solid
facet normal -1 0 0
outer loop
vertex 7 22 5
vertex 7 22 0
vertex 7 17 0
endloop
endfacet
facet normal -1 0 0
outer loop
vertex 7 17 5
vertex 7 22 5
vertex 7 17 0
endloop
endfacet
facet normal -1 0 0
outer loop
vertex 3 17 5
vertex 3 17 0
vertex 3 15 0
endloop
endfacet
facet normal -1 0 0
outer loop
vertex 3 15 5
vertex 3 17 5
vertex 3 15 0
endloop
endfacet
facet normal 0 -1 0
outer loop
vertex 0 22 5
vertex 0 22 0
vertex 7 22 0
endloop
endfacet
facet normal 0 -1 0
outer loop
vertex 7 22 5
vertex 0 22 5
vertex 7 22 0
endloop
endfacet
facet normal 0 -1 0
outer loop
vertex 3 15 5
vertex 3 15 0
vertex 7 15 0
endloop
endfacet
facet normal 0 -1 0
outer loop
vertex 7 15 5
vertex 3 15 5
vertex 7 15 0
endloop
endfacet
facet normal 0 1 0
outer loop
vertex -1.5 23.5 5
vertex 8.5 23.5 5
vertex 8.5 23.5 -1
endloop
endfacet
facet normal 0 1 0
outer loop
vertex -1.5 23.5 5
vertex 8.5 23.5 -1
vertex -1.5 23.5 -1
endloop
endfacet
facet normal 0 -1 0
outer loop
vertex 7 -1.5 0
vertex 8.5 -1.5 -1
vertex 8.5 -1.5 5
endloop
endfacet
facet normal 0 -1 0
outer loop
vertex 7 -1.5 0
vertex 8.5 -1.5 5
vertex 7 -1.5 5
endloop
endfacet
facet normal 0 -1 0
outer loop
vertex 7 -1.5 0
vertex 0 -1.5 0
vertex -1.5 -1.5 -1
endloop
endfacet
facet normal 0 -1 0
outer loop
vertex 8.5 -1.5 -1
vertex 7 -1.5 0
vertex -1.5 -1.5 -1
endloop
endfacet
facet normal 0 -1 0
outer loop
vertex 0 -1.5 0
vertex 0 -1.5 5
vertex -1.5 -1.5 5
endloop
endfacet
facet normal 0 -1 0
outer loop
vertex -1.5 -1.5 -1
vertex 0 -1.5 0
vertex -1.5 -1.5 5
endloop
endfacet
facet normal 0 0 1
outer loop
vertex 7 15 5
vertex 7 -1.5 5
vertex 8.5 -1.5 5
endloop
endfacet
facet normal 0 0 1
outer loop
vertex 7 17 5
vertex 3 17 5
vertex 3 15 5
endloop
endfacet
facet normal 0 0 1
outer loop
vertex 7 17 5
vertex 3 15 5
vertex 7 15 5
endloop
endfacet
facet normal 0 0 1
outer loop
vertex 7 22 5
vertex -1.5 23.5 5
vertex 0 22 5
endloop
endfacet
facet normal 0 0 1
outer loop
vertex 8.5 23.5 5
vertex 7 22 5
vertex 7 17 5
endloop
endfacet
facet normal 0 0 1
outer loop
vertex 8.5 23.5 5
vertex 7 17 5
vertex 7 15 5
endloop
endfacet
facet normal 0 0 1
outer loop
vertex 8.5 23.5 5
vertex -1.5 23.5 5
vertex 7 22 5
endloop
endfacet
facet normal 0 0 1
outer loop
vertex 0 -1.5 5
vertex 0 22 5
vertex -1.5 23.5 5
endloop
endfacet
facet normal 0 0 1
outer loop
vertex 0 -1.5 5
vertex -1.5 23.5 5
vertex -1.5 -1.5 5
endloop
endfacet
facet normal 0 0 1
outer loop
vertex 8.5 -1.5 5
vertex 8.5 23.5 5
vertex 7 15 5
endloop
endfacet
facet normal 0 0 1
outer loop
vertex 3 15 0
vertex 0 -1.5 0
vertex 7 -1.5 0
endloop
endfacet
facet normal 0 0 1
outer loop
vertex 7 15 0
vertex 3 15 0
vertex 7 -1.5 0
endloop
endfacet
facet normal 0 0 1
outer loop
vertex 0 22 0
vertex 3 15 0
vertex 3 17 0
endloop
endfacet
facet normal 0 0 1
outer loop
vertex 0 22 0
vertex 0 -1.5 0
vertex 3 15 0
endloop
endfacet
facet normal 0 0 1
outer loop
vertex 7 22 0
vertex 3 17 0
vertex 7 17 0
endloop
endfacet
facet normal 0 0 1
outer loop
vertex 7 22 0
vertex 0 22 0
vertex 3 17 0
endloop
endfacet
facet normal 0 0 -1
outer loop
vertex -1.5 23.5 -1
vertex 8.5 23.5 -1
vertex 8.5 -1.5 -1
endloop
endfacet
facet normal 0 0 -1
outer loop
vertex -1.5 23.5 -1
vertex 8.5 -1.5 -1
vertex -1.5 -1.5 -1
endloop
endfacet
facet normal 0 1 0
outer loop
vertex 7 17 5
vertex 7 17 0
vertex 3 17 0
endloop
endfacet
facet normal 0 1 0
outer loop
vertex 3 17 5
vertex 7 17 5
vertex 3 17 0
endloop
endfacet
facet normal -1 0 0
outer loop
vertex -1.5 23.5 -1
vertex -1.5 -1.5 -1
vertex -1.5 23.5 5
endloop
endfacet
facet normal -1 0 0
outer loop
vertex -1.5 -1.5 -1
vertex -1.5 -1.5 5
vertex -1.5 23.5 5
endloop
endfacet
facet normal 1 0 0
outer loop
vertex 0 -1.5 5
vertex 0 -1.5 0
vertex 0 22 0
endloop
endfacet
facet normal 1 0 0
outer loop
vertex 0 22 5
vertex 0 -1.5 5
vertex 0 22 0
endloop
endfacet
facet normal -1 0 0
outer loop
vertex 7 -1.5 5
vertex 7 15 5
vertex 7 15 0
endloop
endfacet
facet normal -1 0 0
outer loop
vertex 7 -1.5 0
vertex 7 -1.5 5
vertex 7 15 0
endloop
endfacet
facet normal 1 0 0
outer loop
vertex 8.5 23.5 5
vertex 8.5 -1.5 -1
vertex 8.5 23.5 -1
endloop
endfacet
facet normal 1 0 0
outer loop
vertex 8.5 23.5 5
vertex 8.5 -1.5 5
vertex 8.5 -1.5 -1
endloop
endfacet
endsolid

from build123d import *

# Parameters (mm, degrees)
SKETCH1_W           = 10
SKETCH1_H           = 25
BOSS_EXTRUDE1_DEPTH = 5
SKETCH2_W           = 10
SKETCH2_H           = 25
BOSS_EXTRUDE2_DEPTH = 1
SKETCH3_W           = 7
SKETCH3_H           = 5
CUT_EXTRUDE1_DEPTH  = 5


with BuildPart() as part:
    # Sketch1 → Boss-Extrude1 (new body)
    with BuildSketch(Plane.XY):
        with Locations((3.5, 11)):
            Rectangle(SKETCH1_W, SKETCH1_H)
        Polygon((7, 17), (3, 17), (3, 15), (7, 15), (7, 0), (0, 0), (0, 22), (7, 22), align=None, mode=Mode.SUBTRACT)
    extrude(amount=BOSS_EXTRUDE1_DEPTH)

    # Sketch2 → Boss-Extrude2 (add)
    with BuildSketch(Plane(origin=(0, 0, 0), x_dir=(-1, 0, 0), z_dir=(0, 0, -1))):
        with Locations((-3.5, 11)):
            Rectangle(SKETCH2_W, SKETCH2_H)
    extrude(amount=BOSS_EXTRUDE2_DEPTH)

    # Sketch3 → Cut-Extrude1 (cut)
    with BuildSketch(Plane(origin=(0, 0, 0), x_dir=(1, 0, 0), z_dir=(0, 1, 0))):
        with Locations((3.5, -2.5)):
            Rectangle(SKETCH3_W, SKETCH3_H)
    extrude(amount=-CUT_EXTRUDE1_DEPTH, mode=Mode.SUBTRACT)


solid = part.part
